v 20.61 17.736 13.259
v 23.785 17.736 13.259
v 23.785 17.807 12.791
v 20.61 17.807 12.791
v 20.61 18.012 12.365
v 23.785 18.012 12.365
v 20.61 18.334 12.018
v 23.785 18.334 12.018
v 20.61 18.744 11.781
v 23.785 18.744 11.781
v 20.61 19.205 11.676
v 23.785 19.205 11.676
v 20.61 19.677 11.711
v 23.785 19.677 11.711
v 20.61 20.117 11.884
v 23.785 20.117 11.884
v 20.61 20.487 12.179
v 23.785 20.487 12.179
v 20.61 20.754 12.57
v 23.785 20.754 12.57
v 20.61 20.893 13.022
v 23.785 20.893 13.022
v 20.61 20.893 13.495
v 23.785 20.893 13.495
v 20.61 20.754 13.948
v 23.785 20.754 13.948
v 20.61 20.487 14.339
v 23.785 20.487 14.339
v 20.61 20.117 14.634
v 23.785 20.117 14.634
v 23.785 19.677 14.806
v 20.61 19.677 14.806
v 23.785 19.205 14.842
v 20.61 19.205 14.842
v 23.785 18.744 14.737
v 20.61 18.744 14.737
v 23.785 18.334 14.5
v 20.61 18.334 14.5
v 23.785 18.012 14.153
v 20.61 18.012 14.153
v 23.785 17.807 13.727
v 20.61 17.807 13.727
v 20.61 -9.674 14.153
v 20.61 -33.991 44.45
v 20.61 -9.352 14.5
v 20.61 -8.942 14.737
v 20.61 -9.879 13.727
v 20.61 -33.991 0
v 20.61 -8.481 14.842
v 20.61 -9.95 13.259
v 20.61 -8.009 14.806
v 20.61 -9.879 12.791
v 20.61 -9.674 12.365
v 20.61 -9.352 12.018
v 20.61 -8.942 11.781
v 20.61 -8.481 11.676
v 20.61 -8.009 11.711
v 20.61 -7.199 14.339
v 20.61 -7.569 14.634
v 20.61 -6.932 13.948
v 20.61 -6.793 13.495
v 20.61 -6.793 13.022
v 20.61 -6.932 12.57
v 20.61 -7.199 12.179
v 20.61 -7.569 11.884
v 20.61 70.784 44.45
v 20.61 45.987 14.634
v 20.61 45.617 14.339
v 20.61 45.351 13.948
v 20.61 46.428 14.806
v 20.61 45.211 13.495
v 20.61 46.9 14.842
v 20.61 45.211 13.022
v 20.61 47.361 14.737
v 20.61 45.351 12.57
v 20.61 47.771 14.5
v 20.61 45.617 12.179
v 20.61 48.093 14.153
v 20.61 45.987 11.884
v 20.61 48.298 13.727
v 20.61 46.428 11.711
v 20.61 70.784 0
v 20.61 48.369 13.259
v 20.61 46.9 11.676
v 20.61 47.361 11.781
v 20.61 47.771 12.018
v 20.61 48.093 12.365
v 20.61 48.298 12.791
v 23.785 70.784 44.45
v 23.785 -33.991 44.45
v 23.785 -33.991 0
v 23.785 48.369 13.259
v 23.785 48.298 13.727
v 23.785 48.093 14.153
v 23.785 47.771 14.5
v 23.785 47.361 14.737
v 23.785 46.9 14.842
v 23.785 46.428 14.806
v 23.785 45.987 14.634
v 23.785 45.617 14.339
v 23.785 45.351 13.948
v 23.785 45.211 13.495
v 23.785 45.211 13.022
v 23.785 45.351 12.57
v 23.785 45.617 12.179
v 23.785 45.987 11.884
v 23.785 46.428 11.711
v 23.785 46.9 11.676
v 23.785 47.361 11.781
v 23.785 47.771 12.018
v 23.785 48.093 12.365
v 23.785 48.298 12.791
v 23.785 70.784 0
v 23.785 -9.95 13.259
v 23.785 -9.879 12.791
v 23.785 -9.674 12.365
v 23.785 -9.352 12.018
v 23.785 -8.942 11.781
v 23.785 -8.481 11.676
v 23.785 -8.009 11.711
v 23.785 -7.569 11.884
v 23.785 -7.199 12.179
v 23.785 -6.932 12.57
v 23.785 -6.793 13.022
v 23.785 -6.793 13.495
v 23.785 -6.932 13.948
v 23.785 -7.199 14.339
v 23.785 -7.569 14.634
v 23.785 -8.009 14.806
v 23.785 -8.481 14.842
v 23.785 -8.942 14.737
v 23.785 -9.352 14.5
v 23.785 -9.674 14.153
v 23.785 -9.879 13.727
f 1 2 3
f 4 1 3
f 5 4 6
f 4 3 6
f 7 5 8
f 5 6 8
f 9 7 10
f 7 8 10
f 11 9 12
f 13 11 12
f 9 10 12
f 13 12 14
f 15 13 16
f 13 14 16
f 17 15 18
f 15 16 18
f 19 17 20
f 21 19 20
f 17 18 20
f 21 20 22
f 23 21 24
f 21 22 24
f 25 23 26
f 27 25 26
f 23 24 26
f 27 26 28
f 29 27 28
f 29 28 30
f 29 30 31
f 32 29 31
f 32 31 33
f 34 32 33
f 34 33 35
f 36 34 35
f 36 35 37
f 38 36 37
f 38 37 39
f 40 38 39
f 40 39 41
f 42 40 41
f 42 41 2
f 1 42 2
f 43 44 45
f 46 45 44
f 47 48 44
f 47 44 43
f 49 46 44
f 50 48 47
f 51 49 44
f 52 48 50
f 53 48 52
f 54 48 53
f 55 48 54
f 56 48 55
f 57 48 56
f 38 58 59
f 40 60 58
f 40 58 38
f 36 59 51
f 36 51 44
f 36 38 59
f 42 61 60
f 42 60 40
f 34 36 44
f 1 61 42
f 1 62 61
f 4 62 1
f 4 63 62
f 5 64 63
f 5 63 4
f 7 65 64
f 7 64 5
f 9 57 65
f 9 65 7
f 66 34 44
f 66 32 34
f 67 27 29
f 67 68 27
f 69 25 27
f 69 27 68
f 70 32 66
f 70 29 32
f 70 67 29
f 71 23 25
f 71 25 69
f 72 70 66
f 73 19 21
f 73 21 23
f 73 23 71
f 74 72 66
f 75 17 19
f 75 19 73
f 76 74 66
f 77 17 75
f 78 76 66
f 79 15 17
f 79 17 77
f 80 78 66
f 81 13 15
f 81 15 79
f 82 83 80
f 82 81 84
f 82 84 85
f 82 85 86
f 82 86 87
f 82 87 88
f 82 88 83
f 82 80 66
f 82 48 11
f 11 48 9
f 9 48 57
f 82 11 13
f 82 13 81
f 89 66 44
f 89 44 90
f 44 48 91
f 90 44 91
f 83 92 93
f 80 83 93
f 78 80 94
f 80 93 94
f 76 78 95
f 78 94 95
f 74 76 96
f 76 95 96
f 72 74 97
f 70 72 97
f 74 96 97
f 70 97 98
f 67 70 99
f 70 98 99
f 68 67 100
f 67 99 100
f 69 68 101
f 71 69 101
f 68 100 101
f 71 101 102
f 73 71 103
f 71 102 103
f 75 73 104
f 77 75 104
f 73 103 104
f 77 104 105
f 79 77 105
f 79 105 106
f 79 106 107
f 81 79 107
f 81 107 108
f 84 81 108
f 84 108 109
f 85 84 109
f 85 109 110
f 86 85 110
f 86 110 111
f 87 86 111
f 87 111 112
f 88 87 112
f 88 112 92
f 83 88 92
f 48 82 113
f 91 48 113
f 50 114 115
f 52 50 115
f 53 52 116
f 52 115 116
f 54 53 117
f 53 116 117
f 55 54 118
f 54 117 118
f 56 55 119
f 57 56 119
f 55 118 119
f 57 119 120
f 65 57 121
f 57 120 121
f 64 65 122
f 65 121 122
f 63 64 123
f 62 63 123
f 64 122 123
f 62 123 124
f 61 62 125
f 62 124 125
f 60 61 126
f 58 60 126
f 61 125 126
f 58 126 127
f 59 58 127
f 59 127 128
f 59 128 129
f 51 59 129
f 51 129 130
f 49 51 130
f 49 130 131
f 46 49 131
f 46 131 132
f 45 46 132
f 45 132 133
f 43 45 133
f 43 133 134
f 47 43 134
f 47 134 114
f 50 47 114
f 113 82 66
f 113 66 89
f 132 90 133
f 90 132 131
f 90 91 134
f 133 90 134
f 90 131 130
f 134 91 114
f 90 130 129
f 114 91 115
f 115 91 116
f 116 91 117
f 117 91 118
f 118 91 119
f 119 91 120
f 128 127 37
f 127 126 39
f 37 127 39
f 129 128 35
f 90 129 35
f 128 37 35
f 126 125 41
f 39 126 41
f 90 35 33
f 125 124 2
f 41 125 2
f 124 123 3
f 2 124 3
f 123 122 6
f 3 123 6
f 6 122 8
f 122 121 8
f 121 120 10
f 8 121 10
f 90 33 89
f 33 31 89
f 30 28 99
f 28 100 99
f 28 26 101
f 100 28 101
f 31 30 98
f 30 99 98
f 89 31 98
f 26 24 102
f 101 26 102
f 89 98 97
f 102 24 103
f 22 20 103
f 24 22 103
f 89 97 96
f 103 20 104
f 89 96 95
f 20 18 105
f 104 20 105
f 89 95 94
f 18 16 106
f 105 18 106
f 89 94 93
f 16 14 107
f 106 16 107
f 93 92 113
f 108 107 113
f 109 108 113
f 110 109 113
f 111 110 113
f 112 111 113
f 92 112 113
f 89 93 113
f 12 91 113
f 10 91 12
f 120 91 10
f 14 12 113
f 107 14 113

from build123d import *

# Parameters (mm, degrees)
F0_W     = 3.175
F0_H     = 104.775
F1_DEPTH = 44.45
F3_DEPTH = 152.4


with BuildPart() as f1:
    # F0 (on Top) → F1 (new body)
    with BuildSketch(Plane.XY):
        with Locations((22.19739, 18.396585)):
            Rectangle(F0_W, F0_H)
    extrude(amount=F1_DEPTH)

    # F2 (on face) → F3 (cut)
    with BuildSketch(Plane.YZ.offset(23.78489)):
        with BuildLine():
            ThreePointArc((-6.774815, 13.2588), (-8.362315, 14.8463), (-9.949815, 13.2588))
            Line((-9.949815, 13.2588), (-8.362315, 13.2588))
            Line((-8.362315, 13.2588), (-6.774815, 13.2588))
        make_face()
        with BuildLine():
            Line((-8.362315, 13.2588), (-9.949815, 13.2588))
            ThreePointArc((-9.949815, 13.2588), (-8.362315, 11.6713), (-6.774815, 13.2588))
            Line((-6.774815, 13.2588), (-8.362315, 13.2588))
        make_face()
        with BuildLine():
            Line((19.323685, 13.2588), (20.911185, 13.2588))
            ThreePointArc((20.911185, 13.2588), (19.323685, 14.8463), (17.736185, 13.2588))
            Line((17.736185, 13.2588), (19.323685, 13.2588))
        make_face()
        with BuildLine():
            ThreePointArc((17.736185, 13.2588), (19.323685, 11.6713), (20.911185, 13.2588))
            Line((20.911185, 13.2588), (19.323685, 13.2588))
            Line((19.323685, 13.2588), (17.736185, 13.2588))
        make_face()
        with BuildLine():
            ThreePointArc((45.193585, 13.2588), (46.781085, 11.6713), (48.368585, 13.2588))
            ThreePointArc((48.368585, 13.2588), (46.781085, 14.8463), (45.193585, 13.2588))
        make_face()
    extrude(amount=-F3_DEPTH, mode=Mode.SUBTRACT)


solid = f1.part
